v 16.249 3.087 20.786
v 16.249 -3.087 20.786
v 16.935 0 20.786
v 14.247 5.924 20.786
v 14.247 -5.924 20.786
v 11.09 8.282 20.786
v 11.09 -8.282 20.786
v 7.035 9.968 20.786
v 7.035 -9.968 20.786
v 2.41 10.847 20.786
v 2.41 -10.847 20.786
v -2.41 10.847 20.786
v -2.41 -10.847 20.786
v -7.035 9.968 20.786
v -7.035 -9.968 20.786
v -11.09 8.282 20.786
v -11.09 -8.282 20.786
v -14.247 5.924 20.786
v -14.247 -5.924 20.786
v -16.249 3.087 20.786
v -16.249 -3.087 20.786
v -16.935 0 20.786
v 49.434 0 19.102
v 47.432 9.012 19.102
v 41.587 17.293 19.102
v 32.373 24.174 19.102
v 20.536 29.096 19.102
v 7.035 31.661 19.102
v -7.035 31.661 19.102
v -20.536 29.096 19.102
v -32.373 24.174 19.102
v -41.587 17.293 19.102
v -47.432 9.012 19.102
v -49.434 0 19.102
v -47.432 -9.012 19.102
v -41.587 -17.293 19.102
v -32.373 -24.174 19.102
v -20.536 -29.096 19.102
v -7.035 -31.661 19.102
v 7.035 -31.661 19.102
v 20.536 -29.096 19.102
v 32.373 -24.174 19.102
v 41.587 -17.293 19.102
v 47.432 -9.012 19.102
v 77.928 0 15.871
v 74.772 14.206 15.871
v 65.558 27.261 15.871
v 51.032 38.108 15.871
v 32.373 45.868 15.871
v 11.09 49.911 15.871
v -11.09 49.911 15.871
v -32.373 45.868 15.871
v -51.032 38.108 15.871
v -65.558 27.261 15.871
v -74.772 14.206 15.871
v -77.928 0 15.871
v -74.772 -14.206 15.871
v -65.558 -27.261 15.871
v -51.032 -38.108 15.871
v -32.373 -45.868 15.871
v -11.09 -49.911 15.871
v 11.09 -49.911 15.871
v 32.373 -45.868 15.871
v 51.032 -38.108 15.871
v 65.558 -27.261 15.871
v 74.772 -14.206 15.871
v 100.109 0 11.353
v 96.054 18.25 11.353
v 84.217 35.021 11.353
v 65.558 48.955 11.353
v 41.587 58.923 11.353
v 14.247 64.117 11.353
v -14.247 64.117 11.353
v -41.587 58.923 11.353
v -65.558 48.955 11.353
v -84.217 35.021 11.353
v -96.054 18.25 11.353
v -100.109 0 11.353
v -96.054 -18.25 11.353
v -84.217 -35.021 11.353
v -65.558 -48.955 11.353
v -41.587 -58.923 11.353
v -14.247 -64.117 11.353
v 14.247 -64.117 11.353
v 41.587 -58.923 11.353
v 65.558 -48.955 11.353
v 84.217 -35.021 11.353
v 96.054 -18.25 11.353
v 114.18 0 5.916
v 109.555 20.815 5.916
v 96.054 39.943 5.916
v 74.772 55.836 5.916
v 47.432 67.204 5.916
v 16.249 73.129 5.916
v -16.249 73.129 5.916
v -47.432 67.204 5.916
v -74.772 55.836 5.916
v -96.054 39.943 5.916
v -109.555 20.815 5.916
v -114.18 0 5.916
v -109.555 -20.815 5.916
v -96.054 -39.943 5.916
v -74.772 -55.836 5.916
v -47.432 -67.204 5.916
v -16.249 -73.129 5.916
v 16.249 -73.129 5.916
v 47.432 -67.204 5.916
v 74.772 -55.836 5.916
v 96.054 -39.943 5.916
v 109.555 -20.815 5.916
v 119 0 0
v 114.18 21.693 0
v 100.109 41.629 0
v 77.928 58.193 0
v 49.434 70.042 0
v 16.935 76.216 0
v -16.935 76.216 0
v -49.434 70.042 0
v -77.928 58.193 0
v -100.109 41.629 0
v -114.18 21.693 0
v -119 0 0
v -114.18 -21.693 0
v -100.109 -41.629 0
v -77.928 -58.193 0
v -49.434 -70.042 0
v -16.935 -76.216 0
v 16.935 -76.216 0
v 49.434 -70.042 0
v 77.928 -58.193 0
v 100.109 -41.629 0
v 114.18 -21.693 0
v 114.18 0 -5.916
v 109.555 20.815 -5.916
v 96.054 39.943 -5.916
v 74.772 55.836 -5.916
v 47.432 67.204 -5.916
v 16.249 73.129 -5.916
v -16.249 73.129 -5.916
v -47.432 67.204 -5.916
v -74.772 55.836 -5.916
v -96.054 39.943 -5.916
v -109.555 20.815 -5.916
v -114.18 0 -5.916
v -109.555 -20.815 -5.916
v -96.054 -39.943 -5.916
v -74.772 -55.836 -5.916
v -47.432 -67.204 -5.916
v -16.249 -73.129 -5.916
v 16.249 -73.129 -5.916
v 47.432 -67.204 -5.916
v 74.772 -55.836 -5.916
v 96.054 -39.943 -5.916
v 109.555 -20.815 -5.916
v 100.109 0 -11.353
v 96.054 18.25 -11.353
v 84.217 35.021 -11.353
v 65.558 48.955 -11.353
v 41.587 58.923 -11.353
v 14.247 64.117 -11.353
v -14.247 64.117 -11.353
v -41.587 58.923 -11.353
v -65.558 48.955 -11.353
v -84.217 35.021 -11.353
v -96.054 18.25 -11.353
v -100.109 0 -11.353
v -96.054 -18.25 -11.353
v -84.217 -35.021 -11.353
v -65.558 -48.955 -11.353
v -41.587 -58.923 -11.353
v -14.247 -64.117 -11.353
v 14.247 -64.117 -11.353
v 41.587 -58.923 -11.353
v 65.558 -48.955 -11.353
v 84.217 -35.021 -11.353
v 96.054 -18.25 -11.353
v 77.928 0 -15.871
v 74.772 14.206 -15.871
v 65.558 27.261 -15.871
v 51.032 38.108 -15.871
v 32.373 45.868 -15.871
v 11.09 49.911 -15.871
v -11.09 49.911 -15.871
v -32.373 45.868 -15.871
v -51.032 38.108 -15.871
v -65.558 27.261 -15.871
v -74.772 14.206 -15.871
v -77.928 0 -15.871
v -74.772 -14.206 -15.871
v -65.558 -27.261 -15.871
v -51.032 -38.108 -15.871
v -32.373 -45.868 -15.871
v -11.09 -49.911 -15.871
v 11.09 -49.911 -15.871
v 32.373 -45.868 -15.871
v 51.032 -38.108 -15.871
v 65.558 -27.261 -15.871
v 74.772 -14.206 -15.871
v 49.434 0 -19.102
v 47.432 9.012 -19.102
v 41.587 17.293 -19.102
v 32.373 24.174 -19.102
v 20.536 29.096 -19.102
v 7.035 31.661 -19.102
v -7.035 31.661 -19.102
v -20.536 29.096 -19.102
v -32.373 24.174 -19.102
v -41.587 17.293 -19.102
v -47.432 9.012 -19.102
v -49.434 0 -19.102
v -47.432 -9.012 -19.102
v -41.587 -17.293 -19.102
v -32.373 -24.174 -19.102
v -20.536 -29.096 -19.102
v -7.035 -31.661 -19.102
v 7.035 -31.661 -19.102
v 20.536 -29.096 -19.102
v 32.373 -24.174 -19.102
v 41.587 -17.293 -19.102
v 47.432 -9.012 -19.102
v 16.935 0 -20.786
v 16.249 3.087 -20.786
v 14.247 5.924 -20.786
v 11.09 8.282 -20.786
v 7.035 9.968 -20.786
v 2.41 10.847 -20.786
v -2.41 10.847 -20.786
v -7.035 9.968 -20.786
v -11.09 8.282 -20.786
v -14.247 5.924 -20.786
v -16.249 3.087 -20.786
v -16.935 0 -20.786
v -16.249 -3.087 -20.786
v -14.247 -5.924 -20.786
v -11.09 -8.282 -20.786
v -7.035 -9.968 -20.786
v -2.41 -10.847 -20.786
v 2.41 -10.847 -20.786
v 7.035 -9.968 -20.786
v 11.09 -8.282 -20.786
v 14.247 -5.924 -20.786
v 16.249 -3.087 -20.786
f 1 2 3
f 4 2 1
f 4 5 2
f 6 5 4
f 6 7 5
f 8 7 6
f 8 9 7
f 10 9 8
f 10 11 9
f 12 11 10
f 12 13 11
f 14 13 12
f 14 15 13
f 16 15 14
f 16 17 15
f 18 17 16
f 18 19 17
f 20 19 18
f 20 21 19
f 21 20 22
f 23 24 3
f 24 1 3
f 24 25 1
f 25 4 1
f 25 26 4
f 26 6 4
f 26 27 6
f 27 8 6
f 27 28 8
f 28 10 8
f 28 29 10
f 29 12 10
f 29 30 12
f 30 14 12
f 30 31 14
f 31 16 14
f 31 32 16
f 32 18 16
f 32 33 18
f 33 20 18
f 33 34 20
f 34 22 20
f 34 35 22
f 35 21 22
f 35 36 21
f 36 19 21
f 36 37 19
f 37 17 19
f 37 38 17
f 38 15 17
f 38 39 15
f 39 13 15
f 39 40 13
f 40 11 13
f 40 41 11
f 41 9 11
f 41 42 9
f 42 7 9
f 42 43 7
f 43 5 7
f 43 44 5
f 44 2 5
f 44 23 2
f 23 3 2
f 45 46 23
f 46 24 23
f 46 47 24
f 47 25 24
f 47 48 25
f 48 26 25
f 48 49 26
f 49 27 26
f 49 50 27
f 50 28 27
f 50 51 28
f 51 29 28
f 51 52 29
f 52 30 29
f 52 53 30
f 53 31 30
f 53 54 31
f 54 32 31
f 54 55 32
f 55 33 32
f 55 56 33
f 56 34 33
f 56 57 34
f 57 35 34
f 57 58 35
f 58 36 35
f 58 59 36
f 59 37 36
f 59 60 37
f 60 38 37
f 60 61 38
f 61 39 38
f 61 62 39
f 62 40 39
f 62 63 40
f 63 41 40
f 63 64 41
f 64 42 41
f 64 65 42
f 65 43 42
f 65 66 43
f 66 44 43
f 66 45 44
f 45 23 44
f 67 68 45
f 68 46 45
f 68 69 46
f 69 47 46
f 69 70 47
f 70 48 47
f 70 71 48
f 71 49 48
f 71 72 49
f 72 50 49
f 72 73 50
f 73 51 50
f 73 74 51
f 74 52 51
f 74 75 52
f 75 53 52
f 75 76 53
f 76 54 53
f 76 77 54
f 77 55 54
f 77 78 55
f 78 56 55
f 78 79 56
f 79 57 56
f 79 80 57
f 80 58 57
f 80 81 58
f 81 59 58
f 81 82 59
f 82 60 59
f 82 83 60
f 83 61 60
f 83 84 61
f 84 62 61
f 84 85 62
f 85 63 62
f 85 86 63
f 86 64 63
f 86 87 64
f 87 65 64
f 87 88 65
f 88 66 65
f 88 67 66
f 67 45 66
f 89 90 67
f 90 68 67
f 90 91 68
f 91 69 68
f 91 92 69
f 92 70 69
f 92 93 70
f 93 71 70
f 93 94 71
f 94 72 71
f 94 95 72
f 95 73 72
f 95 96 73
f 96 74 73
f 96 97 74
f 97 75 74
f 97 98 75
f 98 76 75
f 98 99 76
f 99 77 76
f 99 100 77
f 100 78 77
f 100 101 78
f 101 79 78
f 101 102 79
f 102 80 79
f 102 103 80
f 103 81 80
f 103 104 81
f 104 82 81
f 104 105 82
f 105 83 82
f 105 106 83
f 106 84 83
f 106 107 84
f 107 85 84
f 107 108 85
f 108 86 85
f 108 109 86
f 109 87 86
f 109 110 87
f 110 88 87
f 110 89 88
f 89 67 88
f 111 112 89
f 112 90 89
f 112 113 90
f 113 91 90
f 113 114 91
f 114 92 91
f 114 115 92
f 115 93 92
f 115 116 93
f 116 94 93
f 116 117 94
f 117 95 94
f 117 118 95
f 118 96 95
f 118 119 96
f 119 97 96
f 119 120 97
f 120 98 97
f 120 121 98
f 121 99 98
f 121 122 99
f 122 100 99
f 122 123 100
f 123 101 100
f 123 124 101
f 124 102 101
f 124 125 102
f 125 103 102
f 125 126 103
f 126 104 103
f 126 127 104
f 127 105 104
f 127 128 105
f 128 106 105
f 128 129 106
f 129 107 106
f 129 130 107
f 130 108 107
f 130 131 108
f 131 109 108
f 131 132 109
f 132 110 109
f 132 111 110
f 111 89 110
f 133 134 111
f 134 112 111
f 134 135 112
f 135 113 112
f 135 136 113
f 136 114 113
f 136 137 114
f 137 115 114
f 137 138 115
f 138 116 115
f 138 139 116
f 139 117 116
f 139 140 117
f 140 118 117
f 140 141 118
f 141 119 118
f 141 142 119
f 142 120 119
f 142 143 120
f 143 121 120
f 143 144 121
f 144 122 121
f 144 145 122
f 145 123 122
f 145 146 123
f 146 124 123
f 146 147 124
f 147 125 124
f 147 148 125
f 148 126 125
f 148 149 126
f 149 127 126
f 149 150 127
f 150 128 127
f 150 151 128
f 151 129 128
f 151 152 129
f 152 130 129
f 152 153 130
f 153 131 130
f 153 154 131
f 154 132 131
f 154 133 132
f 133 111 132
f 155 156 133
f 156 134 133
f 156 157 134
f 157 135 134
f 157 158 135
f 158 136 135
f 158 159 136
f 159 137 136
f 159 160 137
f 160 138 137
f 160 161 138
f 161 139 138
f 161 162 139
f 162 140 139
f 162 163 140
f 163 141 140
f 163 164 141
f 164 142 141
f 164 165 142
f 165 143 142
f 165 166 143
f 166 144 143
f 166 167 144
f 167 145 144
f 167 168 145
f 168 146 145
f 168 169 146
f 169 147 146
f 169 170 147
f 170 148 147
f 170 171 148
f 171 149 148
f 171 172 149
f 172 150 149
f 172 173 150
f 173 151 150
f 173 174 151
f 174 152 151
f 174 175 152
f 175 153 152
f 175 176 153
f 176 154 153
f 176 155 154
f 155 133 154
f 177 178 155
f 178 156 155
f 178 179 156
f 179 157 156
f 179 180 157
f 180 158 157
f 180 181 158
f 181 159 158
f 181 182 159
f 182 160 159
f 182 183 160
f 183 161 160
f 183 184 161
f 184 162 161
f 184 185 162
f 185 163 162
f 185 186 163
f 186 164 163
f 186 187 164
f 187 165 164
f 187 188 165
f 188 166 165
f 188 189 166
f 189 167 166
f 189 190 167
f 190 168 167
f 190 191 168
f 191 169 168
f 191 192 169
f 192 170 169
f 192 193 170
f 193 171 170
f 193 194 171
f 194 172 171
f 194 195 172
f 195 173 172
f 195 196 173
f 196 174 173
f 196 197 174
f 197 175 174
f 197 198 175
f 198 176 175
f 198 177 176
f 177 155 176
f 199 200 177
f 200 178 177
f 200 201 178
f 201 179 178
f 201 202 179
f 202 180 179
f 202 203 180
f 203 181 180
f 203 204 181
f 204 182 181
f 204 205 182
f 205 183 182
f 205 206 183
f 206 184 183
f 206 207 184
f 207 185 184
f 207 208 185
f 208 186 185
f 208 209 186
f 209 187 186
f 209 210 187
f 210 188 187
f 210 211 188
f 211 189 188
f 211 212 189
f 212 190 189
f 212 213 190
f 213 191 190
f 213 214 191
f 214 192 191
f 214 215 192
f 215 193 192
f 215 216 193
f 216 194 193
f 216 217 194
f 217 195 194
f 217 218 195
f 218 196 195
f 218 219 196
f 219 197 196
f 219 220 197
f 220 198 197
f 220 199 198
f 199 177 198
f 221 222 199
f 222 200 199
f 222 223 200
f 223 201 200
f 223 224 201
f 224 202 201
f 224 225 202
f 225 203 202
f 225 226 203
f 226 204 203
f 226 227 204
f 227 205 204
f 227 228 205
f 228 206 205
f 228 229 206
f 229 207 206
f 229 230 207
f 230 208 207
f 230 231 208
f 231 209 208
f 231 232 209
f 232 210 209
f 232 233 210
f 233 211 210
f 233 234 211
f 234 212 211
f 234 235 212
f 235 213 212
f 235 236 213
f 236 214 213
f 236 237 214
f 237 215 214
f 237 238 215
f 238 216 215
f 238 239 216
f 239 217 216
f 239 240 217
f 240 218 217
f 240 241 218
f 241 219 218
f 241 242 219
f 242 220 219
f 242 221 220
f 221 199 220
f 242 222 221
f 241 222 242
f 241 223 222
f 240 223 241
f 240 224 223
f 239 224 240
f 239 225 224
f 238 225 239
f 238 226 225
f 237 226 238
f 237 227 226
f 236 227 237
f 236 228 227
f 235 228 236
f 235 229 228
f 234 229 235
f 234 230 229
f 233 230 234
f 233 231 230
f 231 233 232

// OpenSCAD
// Generated by SolidPython 1.0.1 on 2020-07-29 00:46:53


scale(v = [17, 11, 3]) {
	sphere(r = 7);
}
/***********************************************
*********      SolidPython code:      **********
************************************************
 
# import packages: SolidPython
from solid import *
from solid.utils import *
from itertools import chain, combinations, permutations


class Resize:

    def __init__(self, scad_file):
        self.scad_file = scad_file
        #self.scad_file = import_scad(scad_file)
        # cone/cylinder param:
        self.r1 = 0
        self.r2 = 0
        self.h = 0
        # rectangular prism param:
        self.w = 0
        self.l = 0
        # ellipse param:
        self.r = 0

    # import OpenScad code (file name corresponds to shape)


    # classify shape + parameters
    def assign(self, param1, param2, param3):
        if self.scad_file == 'cone.scad':
            self.r1 = param1
            self.r2 = param2
            self.h = param3
        elif self.scad_file == 'cylinder.scad':
            self.r1 = param1
            self.r2 = param2
            self.h = param3
        elif self.scad_file == 'rectangularPrism.scad':
            self.h = param1
            self.l = param2
            self.w = param3
        else:
            self.r = param1
            self.h = param2

    # resize parameters
    def iterate(self):
        x = range(3, 20, 2)
        i = 1
        if self.scad_file == 'cone.scad':
            tempList = list(permutations(x, 2))
            for temp in tempList:
                param1 = temp[0]
                param2 = temp[1]
                filepath = 'produced_scad_files/' + 'cone' + str(param1) + '_' + str(param2) + '_' + '.scad'
                scad_render_to_file(cylinder(h=param1, r1=param2, r2=0), filepath)

        elif self.scad_file == 'cylinder.scad':
            tempList = list(permutations(x, 3))
            for temp in tempList:
                param1 = temp[0]
                param2 = temp[1]
                filepath = 'produced_scad_files/' + 'cylinder' + str(param1) + '_' + str(param2) + '_' + '.scad'
                scad_render_to_file(cylinder(h=param1, r1=param2, r2=param2), filepath)

        elif self.scad_file == 'rectangularPrism.scad':
            tempList = list(permutations(x, 3))
            for temp in tempList:
                param1 = temp[0]
                param2 = temp[1]
                param3 = temp[2]
                filepath = 'produced_scad_files/' + 'rectangularPrism' + str(param1) + '_' + str(param2) + '_' + str(
                    param3) + '.scad'
                scad_render_to_file(cube(size=(param1, param2, param3)), filepath)

        elif self.scad_file == 'ellipse.scad':
            tempList = list(permutations(x, 4))
            for temp in tempList:
                param1 = temp[0]
                param2 = temp[1]
                param3 = temp[2]
                param4 = temp[3]
                filepath = 'produced_scad_files/' + 'ellipse' + str(param1) + '_' + str(param2) + '_' + str(param3) + '_' + str(param4) + '.scad'
                scad_render_to_file(scale([param1, param2, param3])(sphere(r=param4)), filepath)

    def render_to_scadfile(self):
        scad_render_to_file(scad, 'example.scad') 
 
************************************************/
